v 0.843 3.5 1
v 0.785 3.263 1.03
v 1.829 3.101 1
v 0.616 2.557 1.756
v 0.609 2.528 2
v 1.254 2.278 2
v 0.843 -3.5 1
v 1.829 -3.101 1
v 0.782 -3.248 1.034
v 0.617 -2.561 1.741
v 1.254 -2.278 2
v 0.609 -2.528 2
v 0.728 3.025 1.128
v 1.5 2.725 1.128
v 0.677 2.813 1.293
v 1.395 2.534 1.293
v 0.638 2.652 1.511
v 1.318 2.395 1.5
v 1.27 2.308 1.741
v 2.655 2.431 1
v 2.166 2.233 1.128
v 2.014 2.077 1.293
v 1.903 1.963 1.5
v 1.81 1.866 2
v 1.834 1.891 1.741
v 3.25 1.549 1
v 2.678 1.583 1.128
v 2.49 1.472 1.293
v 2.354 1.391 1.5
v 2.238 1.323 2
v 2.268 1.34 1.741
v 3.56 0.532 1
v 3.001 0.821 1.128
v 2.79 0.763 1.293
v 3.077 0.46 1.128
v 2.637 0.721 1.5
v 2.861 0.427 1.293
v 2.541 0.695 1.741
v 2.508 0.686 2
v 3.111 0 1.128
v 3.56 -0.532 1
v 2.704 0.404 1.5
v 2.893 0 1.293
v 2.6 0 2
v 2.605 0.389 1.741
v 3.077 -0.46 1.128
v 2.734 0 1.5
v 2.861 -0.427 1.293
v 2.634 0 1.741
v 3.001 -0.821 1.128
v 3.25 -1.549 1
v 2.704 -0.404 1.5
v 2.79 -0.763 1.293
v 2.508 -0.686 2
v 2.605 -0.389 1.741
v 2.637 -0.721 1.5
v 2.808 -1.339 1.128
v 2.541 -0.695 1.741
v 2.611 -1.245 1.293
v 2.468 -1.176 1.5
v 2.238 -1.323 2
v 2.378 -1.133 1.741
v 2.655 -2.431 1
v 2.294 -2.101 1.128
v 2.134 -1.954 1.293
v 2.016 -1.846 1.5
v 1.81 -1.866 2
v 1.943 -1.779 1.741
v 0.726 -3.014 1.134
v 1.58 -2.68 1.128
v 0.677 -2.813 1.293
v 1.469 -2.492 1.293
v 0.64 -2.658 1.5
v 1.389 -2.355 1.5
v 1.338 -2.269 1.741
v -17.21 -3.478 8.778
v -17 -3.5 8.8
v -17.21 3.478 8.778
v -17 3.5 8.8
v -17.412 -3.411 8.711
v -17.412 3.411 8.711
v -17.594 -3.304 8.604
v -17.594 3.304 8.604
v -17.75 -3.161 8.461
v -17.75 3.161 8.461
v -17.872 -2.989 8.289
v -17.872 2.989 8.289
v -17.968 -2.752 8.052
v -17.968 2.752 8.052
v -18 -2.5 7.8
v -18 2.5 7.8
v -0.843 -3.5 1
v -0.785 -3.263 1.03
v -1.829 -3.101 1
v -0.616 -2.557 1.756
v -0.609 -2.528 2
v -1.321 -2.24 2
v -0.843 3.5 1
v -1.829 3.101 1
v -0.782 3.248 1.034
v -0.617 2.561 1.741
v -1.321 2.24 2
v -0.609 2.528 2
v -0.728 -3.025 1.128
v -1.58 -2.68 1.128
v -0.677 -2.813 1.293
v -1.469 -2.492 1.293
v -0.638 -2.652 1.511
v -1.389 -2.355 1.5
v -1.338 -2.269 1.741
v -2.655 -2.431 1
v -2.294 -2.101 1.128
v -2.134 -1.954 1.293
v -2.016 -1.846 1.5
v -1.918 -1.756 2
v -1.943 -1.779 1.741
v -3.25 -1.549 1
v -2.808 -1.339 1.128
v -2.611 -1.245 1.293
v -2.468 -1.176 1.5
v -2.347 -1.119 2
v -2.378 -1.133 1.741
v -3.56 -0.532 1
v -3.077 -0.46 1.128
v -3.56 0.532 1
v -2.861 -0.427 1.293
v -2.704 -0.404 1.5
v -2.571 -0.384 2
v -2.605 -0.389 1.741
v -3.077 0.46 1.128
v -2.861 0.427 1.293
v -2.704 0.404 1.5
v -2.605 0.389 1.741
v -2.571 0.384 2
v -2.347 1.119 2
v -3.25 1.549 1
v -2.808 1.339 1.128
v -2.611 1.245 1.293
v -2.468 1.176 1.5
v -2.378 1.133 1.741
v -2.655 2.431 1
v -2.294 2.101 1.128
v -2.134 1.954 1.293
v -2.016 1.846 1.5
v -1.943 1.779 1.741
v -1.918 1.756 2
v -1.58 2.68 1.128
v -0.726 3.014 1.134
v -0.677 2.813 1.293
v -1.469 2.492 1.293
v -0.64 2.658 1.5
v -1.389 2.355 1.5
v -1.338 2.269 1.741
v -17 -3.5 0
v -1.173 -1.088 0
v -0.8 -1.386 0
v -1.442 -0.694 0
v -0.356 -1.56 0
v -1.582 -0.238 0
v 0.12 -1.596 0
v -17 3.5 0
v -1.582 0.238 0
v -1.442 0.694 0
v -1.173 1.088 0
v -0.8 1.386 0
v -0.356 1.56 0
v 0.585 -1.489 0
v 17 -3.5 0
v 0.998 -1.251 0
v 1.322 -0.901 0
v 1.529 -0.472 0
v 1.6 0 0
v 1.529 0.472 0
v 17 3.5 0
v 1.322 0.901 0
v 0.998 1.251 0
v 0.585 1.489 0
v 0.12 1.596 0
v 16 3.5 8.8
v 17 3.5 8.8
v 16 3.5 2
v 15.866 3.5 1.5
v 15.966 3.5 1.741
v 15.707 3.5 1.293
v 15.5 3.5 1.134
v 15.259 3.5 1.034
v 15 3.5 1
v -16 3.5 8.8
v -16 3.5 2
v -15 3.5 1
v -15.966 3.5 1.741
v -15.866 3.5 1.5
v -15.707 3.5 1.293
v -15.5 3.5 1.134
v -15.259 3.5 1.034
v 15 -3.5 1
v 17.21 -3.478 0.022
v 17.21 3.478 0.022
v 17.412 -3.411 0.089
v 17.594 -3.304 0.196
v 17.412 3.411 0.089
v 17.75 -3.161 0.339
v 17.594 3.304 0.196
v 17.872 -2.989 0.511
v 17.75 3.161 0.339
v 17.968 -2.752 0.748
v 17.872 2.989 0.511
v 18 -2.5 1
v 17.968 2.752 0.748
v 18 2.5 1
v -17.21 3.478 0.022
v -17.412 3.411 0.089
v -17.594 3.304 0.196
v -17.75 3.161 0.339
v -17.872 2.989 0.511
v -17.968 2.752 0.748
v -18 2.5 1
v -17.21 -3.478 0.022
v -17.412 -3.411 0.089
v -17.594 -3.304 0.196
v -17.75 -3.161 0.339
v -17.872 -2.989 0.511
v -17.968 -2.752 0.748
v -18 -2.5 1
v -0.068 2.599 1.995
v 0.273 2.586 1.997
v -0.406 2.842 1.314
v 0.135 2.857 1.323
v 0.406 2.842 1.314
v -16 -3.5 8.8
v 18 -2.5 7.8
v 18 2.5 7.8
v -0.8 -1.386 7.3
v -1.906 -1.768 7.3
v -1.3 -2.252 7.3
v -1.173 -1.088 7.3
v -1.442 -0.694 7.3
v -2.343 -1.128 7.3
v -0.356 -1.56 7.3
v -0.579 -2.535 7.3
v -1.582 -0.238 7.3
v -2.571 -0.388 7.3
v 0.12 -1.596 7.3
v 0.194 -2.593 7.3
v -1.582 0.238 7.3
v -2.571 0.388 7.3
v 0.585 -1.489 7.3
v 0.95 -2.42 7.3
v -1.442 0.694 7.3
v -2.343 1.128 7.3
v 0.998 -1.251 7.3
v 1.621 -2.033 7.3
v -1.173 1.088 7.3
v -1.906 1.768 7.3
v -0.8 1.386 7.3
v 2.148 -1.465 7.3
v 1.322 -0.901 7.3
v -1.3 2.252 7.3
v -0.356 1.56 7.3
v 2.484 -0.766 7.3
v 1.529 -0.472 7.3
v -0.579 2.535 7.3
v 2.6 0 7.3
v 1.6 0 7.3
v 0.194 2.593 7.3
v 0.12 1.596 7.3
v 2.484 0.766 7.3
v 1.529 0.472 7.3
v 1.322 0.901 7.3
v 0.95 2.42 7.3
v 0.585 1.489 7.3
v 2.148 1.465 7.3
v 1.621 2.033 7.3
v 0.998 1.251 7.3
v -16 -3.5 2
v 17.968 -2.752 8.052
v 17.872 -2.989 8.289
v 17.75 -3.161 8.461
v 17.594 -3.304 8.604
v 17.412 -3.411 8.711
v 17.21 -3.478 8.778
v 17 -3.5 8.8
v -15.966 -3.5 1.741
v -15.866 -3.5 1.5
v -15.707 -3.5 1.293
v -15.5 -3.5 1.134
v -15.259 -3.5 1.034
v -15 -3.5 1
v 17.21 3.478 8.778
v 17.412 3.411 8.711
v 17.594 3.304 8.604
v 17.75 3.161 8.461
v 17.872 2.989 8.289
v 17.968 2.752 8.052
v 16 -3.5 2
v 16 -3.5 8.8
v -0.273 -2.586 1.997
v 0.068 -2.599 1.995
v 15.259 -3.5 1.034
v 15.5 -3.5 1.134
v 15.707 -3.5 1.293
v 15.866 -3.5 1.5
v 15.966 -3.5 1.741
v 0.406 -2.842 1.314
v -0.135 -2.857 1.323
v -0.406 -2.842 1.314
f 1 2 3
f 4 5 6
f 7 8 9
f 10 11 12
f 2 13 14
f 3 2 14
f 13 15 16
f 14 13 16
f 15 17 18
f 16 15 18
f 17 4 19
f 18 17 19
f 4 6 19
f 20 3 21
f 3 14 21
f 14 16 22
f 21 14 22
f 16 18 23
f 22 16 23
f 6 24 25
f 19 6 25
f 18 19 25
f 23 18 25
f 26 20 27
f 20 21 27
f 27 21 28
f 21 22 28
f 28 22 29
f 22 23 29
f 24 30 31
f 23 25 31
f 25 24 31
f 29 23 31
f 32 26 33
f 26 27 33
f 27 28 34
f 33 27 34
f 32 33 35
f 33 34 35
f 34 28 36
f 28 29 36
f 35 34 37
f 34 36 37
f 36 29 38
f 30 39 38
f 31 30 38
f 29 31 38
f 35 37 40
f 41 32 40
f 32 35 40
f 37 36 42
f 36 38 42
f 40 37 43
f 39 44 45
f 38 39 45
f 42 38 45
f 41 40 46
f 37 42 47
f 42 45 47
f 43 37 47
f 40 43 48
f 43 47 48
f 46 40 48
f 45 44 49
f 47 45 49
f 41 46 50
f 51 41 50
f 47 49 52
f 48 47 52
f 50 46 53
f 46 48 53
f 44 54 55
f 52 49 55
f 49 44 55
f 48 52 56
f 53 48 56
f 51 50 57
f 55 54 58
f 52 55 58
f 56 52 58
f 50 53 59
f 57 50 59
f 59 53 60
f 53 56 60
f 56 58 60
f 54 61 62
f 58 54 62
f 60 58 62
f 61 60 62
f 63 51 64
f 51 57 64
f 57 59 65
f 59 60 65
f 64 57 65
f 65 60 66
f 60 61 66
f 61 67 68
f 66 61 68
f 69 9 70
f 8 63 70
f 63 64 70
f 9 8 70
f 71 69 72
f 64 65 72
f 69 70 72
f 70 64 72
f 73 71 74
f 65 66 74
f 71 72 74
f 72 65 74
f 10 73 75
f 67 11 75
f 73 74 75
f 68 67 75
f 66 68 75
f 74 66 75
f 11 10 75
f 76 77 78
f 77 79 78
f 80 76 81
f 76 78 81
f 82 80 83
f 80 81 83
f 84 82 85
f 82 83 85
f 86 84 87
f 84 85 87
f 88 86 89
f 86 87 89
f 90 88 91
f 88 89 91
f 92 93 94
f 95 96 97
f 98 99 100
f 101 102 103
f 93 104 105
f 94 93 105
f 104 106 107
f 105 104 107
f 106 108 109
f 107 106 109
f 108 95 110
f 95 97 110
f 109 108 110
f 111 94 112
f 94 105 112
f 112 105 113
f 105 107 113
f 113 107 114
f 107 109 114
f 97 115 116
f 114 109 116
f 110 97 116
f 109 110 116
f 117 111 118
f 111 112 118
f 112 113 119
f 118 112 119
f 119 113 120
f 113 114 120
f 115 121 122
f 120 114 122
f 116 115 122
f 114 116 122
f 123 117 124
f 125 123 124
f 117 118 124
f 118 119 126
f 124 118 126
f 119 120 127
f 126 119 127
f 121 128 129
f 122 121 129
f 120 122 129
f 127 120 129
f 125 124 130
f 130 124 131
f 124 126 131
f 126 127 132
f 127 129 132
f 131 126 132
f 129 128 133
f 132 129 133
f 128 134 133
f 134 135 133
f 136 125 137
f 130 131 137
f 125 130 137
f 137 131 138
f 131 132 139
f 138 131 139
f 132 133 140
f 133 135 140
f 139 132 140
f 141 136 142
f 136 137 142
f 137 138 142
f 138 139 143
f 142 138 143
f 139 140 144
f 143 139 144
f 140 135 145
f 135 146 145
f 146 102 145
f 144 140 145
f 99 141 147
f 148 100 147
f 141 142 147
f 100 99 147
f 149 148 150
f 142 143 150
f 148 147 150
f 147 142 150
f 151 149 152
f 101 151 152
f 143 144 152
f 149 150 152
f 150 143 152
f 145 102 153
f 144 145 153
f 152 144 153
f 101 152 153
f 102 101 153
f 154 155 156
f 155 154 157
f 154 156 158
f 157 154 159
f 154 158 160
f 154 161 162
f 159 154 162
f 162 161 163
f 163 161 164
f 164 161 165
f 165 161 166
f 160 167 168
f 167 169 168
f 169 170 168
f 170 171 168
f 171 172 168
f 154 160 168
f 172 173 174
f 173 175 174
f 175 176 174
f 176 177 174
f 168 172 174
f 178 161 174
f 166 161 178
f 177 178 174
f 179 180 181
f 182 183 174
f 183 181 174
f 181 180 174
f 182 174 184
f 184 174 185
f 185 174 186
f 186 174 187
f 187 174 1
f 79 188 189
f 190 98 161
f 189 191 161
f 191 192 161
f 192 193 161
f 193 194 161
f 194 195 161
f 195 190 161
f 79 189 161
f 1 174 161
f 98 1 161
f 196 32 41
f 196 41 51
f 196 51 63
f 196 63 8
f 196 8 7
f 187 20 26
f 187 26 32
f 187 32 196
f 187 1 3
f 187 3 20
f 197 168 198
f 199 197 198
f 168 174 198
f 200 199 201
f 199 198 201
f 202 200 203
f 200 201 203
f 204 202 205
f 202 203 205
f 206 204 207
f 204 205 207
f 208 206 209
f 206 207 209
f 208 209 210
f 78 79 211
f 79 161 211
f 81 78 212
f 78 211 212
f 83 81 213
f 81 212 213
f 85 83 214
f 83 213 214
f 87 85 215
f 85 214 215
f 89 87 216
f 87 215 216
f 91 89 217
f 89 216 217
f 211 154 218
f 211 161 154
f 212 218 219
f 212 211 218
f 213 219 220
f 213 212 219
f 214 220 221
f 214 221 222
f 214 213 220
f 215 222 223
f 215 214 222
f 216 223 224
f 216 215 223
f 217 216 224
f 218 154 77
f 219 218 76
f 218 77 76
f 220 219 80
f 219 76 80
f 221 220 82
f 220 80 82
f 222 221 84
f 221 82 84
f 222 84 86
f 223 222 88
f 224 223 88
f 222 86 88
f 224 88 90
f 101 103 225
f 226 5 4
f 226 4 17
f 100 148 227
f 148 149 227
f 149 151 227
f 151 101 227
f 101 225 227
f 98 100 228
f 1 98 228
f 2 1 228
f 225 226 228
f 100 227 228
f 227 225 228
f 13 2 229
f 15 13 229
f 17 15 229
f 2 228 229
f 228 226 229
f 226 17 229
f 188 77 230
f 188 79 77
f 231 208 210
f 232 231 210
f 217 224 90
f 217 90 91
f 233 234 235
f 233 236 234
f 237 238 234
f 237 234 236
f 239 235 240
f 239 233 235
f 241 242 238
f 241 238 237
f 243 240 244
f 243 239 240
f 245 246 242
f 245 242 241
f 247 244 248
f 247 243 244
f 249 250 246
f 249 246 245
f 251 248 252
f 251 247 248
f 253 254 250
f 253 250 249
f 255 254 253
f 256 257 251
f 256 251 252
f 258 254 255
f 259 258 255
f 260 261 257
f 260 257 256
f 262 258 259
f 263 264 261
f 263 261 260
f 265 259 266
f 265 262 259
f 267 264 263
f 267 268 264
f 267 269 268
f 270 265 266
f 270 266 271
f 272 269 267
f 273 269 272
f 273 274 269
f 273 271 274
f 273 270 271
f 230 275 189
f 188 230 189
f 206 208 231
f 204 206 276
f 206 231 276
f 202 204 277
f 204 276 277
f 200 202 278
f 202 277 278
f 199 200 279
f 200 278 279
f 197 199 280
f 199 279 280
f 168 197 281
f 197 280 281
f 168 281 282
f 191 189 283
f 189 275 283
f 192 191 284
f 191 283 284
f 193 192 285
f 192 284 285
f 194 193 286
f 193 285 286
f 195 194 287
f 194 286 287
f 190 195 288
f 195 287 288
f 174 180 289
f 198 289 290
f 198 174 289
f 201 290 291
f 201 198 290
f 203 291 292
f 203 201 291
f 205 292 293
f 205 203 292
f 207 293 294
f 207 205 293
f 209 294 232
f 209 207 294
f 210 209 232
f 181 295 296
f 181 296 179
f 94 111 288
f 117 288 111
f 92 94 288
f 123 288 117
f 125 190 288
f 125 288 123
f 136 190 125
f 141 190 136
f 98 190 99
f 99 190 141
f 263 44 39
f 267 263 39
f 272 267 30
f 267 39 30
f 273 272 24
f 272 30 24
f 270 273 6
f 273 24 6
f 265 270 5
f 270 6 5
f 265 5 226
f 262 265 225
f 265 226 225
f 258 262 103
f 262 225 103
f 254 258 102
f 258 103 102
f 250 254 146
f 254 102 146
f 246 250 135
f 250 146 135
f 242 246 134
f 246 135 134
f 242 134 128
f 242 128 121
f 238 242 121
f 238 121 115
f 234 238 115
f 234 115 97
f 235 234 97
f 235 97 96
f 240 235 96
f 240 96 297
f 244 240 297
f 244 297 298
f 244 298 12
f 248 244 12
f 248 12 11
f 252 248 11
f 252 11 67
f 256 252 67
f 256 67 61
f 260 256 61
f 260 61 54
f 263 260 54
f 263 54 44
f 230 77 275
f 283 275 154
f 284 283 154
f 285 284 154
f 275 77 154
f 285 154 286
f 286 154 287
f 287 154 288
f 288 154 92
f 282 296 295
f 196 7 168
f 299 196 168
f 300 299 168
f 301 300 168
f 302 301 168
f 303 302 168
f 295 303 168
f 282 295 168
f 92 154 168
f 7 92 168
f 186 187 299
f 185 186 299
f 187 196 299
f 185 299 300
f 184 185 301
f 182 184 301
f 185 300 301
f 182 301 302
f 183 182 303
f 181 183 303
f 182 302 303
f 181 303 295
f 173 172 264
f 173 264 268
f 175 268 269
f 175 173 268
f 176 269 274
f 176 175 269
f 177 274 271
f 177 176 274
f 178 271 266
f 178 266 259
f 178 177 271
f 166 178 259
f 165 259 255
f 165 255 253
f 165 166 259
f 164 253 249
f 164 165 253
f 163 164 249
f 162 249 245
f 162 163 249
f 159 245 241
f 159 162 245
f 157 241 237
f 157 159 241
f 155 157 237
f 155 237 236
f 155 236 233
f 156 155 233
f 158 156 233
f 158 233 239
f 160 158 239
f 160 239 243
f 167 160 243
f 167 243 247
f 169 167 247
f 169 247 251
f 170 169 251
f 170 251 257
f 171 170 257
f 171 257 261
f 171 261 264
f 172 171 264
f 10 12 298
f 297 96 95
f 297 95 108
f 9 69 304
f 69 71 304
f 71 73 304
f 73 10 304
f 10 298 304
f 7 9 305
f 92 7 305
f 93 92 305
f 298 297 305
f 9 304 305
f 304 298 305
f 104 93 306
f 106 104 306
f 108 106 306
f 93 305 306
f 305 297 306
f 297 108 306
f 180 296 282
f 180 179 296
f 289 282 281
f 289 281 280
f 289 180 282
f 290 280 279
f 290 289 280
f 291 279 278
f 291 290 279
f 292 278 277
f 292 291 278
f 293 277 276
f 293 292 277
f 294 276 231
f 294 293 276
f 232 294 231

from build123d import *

# Parameters (mm, degrees)
F0_W     = 32
F0_H     = 7
F0_R     = 2.6
F0_W_2   = 2
F0_R_2   = 1.6
F1_DEPTH = 1
F2_DEPTH = 8.8
F3_DEPTH = 7.3
F4_R     = 1
F5_R     = 1


with BuildPart() as f1:
    # F0 (on Top) → F1 (new body)
    with BuildSketch(Plane.XY):
        Rectangle(F0_W, F0_H)
        Circle(F0_R, mode=Mode.SUBTRACT)
        with Locations((-17, 0)):
            Rectangle(F0_W_2, F0_H)
        with Locations((17, 0)):
            Rectangle(F0_W_2, F0_H)
        Circle(F0_R)
        Circle(F0_R_2, mode=Mode.SUBTRACT)
    extrude(amount=F1_DEPTH)

    # F0 (on Top) → F2 (join)
    with BuildSketch(Plane.XY):
        with Locations((-17, 0)):
            Rectangle(F0_W_2, F0_H)
        with Locations((17, 0)):
            Rectangle(F0_W_2, F0_H)
    extrude(amount=F2_DEPTH)

    # F0 (on Top) → F3 (join)
    with BuildSketch(Plane.XY):
        Circle(F0_R)
        Circle(F0_R_2, mode=Mode.SUBTRACT)
    extrude(amount=F3_DEPTH)

    # F4
    f4_edges = [f1.edges().sort_by_distance(p)[0] for p in [
        (-16, 0, 1),
        (16, 0, 1),
        (-18, 0, 0),
        (18, 0, 0),
        (-18, 0, 8.8),
        (18, 0, 8.8),
        (-18, -3.5, 4.4),
        (-18, 3.5, 4.4),
        (18, -3.5, 4.4),
        (18, 3.5, 4.4),
    ]]
    fillet(f4_edges, radius=F4_R)

    # F5
    f5_edges = [f1.edges().sort_by_distance(p)[0] for p in [
        (-2.6, 0, 1),
    ]]
    fillet(f5_edges, radius=F5_R)


solid = f1.part
